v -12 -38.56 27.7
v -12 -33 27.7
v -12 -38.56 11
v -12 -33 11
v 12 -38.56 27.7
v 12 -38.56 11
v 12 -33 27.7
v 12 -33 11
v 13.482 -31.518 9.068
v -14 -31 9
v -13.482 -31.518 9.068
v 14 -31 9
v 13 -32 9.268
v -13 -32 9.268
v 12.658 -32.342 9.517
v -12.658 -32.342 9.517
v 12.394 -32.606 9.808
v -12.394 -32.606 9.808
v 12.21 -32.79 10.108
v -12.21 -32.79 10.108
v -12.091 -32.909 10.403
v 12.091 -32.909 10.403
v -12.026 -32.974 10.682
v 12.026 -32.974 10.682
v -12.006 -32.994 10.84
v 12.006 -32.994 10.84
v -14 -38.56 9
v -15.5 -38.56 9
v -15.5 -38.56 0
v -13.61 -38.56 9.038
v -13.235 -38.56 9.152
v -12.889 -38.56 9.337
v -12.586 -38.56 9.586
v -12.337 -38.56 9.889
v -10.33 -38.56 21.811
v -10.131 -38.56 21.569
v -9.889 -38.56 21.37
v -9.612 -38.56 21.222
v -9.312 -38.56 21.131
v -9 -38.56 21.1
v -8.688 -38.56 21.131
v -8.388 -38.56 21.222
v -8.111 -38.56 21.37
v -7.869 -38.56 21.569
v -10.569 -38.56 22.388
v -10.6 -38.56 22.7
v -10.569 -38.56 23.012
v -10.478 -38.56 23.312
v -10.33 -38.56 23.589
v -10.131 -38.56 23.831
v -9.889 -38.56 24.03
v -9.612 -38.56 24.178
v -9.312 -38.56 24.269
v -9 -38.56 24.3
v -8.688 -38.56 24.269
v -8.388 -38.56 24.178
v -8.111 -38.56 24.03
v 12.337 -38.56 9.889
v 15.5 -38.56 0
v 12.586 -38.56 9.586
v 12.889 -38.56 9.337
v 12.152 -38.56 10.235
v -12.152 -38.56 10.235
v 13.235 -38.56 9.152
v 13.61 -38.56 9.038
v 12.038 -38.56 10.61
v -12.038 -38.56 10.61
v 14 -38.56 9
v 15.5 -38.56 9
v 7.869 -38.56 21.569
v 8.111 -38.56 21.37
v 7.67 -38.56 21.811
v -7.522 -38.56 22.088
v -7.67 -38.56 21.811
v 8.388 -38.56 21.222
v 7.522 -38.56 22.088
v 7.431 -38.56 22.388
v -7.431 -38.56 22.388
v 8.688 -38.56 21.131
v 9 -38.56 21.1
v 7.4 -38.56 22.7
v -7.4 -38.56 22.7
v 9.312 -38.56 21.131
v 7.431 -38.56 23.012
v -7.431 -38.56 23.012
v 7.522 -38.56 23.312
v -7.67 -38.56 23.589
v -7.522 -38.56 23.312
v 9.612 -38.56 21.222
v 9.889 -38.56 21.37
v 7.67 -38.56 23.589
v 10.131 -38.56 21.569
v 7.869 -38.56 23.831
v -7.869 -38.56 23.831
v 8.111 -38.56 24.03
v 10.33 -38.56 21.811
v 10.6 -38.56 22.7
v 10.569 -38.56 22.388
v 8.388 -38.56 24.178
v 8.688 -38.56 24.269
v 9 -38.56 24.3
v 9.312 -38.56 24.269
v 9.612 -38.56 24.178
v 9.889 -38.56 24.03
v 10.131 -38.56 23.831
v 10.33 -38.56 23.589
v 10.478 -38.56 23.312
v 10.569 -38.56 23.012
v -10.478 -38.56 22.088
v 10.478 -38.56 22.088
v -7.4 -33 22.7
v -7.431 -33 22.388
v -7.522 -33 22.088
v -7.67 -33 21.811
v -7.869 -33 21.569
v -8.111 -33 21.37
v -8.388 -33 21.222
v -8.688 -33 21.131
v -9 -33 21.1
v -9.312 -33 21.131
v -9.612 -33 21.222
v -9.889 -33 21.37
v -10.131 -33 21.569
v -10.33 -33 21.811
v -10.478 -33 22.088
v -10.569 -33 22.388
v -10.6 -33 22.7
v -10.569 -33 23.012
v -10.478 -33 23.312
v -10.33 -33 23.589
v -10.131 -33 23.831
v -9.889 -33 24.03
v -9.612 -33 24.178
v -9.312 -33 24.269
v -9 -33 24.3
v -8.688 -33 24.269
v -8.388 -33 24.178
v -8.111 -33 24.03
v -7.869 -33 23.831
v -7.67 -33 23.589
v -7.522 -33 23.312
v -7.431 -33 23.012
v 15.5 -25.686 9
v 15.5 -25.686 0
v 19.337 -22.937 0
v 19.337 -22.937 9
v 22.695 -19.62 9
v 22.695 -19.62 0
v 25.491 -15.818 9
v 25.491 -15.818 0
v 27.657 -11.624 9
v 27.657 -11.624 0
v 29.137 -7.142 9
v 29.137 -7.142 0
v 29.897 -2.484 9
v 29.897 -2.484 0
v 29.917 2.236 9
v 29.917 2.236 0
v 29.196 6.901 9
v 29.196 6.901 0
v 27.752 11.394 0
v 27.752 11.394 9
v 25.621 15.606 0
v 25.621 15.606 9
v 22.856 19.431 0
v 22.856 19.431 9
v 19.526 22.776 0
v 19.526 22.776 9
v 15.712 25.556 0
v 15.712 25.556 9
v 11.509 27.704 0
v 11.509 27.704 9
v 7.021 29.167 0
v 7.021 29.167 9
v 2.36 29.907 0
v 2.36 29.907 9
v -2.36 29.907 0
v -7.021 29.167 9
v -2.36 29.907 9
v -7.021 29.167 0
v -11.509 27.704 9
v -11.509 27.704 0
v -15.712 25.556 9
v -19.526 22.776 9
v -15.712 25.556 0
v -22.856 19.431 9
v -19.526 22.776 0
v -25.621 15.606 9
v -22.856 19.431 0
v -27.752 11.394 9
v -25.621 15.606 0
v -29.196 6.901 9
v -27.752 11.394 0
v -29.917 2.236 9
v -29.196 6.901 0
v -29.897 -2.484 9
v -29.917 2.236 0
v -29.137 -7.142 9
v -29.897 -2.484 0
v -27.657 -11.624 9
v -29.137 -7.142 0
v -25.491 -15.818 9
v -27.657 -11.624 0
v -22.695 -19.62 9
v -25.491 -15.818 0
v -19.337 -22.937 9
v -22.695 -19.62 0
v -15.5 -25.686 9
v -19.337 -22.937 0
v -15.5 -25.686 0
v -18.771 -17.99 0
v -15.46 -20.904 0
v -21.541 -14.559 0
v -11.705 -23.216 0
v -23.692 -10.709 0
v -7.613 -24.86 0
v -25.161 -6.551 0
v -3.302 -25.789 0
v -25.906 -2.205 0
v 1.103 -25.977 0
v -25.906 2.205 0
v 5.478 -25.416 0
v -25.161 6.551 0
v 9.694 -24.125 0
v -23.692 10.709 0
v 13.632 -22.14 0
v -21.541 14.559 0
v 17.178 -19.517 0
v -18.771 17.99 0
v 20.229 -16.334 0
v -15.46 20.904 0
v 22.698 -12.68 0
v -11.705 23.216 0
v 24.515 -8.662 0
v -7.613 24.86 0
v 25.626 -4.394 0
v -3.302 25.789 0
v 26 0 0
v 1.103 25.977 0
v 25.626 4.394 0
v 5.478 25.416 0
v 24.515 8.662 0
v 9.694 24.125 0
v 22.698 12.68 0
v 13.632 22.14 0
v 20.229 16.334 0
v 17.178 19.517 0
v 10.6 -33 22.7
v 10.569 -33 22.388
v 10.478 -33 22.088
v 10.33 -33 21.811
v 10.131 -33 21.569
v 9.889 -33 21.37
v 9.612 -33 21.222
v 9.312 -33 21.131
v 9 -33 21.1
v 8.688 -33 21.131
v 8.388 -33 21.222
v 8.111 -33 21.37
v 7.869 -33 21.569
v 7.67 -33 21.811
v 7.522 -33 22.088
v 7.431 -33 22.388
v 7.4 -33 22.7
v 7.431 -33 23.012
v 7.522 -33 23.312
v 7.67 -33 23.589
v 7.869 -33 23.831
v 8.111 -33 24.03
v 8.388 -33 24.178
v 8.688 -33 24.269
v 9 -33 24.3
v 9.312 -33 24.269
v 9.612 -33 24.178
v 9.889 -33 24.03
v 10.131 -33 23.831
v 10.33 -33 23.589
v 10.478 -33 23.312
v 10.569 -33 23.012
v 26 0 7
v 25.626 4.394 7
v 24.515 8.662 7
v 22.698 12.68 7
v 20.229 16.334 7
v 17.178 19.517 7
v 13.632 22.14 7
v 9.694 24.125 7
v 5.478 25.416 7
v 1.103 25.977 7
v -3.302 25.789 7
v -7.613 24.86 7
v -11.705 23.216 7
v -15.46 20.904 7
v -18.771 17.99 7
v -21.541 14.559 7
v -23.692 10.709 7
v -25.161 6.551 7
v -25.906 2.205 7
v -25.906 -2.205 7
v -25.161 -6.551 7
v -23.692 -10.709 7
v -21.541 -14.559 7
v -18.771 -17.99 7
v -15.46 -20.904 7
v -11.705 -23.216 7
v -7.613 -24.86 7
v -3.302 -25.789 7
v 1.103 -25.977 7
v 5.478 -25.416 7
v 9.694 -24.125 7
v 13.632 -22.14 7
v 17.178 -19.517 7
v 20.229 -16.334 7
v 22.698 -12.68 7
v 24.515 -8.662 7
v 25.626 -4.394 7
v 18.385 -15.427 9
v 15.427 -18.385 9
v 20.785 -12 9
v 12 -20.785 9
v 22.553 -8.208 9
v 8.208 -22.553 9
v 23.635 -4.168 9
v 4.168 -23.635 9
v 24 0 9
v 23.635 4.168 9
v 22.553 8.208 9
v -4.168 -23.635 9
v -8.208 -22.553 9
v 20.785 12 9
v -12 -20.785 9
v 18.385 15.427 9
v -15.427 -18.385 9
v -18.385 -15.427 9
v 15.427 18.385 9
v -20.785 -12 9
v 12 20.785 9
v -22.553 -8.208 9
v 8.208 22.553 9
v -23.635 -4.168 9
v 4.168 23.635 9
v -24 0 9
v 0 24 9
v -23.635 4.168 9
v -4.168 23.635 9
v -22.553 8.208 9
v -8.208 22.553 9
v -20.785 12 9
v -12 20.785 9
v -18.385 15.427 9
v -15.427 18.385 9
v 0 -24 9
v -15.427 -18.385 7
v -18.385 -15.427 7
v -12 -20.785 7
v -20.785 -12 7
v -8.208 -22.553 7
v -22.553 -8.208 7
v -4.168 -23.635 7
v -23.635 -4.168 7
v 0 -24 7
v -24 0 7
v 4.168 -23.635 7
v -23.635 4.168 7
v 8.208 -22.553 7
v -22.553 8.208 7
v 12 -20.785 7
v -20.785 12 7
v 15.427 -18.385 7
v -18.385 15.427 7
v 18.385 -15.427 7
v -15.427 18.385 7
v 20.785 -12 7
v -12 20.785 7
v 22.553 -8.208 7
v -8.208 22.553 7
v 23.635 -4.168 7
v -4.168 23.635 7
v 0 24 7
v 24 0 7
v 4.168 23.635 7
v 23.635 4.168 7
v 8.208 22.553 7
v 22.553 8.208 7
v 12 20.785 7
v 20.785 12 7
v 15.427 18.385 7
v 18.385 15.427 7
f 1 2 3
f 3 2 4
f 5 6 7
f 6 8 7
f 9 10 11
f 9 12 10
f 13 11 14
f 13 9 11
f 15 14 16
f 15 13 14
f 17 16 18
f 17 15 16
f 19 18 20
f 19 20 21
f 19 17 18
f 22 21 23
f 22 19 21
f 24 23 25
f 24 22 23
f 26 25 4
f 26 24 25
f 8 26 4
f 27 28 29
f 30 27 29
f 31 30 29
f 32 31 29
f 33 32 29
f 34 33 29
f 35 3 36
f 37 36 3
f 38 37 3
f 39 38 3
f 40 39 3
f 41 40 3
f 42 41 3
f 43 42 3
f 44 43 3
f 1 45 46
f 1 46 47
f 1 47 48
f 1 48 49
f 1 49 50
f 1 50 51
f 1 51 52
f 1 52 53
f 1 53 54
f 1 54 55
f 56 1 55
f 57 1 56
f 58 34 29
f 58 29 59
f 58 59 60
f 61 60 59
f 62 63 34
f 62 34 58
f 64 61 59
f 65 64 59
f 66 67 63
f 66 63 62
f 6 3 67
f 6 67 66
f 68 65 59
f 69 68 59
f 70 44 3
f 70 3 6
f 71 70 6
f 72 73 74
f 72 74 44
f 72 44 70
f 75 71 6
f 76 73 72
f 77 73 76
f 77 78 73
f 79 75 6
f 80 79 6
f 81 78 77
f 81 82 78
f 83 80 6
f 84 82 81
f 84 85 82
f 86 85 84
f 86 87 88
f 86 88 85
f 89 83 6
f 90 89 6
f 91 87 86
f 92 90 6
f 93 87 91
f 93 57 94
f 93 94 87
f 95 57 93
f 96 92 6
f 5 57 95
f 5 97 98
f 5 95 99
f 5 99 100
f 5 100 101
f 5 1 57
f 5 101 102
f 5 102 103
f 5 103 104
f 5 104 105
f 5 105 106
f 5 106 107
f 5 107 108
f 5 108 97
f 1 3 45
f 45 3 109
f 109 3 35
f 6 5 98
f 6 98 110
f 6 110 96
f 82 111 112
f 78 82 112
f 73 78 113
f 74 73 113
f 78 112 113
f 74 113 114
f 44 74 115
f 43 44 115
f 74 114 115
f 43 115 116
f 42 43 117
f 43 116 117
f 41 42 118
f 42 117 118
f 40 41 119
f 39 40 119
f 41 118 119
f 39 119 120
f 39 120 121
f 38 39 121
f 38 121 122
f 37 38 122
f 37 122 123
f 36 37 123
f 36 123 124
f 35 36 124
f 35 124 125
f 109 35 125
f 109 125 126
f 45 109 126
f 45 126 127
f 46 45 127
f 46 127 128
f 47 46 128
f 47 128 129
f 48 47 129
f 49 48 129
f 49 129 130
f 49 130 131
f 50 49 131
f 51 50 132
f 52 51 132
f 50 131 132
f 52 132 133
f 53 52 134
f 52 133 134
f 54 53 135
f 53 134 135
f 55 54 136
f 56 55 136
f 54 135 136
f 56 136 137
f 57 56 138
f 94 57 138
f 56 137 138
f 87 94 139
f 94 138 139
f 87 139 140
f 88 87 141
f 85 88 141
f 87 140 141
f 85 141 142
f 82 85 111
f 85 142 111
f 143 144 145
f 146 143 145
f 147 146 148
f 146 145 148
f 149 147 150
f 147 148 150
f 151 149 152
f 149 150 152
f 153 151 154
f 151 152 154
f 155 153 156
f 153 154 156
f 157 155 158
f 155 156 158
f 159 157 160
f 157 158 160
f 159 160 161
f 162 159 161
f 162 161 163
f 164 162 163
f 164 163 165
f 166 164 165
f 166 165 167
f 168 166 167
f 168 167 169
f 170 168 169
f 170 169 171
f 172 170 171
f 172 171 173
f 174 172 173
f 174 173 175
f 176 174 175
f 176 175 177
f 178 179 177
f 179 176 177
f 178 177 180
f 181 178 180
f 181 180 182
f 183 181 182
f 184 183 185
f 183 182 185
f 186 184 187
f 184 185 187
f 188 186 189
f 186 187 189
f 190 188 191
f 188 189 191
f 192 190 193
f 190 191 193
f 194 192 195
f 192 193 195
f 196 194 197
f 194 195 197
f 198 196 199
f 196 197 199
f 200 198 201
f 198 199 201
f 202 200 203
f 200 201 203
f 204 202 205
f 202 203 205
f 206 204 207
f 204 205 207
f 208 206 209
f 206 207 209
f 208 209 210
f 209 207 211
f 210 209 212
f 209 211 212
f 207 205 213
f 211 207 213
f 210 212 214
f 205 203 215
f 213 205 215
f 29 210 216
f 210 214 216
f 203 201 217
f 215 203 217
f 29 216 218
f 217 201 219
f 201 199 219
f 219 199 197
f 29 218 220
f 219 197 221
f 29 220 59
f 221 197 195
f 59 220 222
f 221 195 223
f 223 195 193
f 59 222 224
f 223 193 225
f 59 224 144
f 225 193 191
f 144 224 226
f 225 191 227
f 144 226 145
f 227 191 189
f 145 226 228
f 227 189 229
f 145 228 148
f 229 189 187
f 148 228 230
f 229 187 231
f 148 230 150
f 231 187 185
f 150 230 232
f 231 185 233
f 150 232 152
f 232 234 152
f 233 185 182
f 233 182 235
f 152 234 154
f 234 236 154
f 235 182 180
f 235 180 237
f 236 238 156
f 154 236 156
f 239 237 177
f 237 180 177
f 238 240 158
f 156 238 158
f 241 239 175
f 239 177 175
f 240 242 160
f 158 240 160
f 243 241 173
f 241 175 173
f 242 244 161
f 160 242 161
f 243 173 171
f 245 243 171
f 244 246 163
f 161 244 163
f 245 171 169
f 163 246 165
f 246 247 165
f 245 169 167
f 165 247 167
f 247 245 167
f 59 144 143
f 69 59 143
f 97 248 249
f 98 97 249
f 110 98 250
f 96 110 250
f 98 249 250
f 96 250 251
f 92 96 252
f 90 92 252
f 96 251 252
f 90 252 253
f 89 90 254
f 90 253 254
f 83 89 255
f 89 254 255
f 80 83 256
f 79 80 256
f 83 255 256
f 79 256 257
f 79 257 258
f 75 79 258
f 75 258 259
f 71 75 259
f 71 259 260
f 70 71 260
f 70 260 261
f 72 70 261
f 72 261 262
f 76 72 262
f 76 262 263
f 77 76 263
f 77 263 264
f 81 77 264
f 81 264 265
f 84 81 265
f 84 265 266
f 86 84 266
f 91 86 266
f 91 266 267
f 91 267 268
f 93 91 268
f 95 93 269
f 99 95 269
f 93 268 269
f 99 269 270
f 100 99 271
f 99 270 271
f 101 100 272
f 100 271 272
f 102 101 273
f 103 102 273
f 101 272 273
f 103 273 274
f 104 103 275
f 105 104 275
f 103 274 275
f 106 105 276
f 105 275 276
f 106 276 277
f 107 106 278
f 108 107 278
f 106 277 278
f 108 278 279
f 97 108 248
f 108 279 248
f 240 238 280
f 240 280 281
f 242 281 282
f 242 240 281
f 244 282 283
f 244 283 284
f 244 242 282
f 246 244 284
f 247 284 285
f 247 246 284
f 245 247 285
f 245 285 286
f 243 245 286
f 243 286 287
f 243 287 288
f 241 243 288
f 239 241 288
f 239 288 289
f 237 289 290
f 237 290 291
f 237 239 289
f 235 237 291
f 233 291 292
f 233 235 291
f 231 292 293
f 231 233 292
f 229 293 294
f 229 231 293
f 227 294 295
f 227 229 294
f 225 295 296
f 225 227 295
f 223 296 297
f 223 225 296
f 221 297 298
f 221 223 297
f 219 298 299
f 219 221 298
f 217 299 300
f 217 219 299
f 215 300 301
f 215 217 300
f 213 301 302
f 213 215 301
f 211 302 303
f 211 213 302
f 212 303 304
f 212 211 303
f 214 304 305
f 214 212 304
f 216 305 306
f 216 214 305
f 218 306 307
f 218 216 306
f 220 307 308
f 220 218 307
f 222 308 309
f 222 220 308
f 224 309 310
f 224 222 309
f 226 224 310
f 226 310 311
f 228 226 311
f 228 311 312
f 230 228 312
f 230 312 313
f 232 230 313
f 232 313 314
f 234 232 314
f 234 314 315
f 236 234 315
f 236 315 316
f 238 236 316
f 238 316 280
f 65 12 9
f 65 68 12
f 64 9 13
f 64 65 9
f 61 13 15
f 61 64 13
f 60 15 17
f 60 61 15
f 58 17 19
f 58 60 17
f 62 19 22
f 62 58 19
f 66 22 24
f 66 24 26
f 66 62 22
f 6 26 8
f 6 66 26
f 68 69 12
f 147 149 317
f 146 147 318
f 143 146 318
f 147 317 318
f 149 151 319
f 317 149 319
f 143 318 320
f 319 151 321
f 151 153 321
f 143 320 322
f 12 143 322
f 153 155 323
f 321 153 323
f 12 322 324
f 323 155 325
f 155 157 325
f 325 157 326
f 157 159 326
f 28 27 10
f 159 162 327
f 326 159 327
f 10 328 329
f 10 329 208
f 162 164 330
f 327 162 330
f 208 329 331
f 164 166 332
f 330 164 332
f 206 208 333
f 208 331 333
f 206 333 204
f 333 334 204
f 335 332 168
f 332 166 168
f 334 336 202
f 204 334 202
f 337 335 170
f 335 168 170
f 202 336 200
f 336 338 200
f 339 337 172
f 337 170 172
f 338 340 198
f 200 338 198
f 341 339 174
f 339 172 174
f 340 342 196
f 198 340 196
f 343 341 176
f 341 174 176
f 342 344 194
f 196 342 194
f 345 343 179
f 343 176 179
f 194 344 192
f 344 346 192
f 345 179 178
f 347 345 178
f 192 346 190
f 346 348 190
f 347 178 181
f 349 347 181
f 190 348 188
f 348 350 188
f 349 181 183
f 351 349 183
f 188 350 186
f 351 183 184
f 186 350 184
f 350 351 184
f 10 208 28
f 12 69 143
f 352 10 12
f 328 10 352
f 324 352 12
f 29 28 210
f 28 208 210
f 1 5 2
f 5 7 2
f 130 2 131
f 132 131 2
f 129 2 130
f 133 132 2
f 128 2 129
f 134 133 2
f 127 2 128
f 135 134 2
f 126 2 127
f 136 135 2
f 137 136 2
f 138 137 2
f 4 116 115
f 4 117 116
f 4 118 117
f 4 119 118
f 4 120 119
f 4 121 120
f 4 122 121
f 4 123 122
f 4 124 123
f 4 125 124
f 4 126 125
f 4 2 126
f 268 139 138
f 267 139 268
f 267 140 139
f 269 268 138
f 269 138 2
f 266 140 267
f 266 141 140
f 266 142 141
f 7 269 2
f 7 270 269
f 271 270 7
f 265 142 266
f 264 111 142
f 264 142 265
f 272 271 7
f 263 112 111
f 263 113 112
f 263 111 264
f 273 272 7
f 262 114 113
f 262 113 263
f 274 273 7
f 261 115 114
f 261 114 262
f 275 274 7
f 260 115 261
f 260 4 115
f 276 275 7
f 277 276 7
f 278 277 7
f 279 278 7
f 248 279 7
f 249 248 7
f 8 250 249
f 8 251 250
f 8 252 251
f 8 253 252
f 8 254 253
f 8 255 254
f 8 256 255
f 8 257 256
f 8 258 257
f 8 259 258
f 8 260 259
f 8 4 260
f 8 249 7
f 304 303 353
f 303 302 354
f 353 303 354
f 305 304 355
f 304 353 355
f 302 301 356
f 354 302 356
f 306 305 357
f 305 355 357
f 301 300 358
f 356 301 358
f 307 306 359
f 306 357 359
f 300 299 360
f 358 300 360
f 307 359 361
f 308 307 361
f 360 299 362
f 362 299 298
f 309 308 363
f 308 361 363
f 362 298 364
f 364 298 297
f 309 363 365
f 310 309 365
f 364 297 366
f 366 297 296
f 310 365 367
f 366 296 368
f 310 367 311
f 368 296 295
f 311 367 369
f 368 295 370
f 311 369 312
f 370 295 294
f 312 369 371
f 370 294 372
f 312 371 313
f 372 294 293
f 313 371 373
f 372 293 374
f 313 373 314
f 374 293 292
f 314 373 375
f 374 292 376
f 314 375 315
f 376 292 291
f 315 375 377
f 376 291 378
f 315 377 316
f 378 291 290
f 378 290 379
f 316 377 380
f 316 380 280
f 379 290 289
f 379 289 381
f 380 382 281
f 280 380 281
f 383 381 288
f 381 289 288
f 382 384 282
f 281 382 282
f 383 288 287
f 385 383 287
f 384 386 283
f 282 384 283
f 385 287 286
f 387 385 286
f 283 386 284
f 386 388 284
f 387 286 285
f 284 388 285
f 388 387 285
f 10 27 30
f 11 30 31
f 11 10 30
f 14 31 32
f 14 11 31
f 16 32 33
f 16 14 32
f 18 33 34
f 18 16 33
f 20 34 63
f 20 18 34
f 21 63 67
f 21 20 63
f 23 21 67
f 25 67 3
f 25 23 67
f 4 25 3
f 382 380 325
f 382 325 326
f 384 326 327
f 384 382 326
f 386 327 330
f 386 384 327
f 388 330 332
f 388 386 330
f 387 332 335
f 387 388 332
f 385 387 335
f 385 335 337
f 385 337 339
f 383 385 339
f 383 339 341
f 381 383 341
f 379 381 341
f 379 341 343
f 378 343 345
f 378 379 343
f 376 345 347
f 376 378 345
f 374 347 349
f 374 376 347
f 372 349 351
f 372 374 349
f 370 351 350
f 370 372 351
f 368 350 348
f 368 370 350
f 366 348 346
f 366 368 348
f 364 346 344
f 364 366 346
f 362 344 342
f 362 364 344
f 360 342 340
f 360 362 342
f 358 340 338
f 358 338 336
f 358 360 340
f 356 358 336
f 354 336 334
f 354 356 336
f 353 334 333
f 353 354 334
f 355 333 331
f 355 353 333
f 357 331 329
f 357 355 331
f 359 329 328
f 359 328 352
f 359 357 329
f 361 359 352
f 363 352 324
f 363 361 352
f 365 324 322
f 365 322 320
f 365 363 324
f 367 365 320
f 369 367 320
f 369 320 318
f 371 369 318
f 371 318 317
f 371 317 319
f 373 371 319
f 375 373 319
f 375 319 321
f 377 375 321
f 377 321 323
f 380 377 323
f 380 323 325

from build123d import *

# Parameters (mm, degrees)
SKETCH_1_R          = 26
EXTRUDE_1_DEPTH     = 7
SKETCH_4_R          = 30
SKETCH_4_R_2        = 24
EXTRUDE_4_DEPTH     = 2
SKETCH_5_W          = 24
SKETCH_5_H          = 5
EXTRUDE_5_DEPTH     = 20.7
EXTRUDE_6_DEPTH     = 2
EXTRUDE_7_DEPTH     = 0.56
SKETCH_7_R          = 1.6
CUT_EXTRUDE_1_DEPTH = 16
FILLET_1_R          = 2
FILLET_2_R          = 2
FILLET_3_R          = 2


with BuildPart() as part:
    # 草图1 → 凸台-拉伸1 (new body)
    with BuildSketch(Plane.XY):
        with BuildLine():
            Line((-15.5, -38), (15.5, -38))
            Line((15.5, -38), (15.5, -25.685599078))
            ThreePointArc((15.5, -25.685599078), (0, 30), (-15.5, -25.685599078))
            Line((-15.5, -25.685599078), (-15.5, -38))
        make_face()
        Circle(SKETCH_1_R, mode=Mode.SUBTRACT)
    extrude(amount=EXTRUDE_1_DEPTH)

    # 草图4 → 凸台-拉伸4 (add)
    with BuildSketch(Plane.XY.offset(7)):
        Circle(SKETCH_4_R)
        Circle(SKETCH_4_R_2, mode=Mode.SUBTRACT)
    extrude(amount=EXTRUDE_4_DEPTH)

    # 草图5 → 凸台-拉伸5 (add)
    with BuildSketch(Plane.XY.offset(7)):
        with Locations((0, -35.5)):
            Rectangle(SKETCH_5_W, SKETCH_5_H)
    extrude(amount=EXTRUDE_5_DEPTH)

    # 草图6 → 凸台-拉伸6 (add)
    with BuildSketch(Plane.XY.offset(7)):
        with BuildLine():
            Line((-15.5, -25.685599078), (-15.5, -38))
            Line((-15.5, -38), (-12, -38))
            Line((-12, -38), (-12, -33))
            Line((-12, -33), (12, -33))
            Line((12, -33), (12, -38))
            Line((12, -38), (15.5, -38))
            Line((15.5, -38), (15.5, -25.685599078))
            ThreePointArc((15.5, -25.685599078), (0, -30), (-15.5, -25.685599078))
        make_face()
    extrude(amount=EXTRUDE_6_DEPTH)

    # 草图9 → 凸台-拉伸7 (add)
    with BuildSketch(Plane.XZ.offset(38)):
        Polygon((15.5, 0), (15.5, 9), (12, 9), (12, 27.7), (-12, 27.7), (-12, 9), (-15.5, 9), (-15.5, 0), align=None)
    extrude(amount=EXTRUDE_7_DEPTH)

    # 草图7 → 切除-拉伸1 (cut)
    with BuildSketch(Plane(origin=(0, -33, 0), x_dir=(1, 0, 0), z_dir=(0, 1, 0))):
        with Locations((9, -22.7)):
            Circle(SKETCH_7_R)
        with Locations((-9, -22.7)):
            Circle(SKETCH_7_R)
    extrude(amount=-CUT_EXTRUDE_1_DEPTH, mode=Mode.SUBTRACT)

    # 圆角1
    fillet_1_edges = [part.edges().sort_by_distance(p)[0] for p in [
        (0, -33, 9),
    ]]
    fillet(fillet_1_edges, radius=FILLET_1_R)

    # 圆角2
    fillet_2_edges = [part.edges().sort_by_distance(p)[0] for p in [
        (12, -35.78, 9),
    ]]
    fillet(fillet_2_edges, radius=FILLET_2_R)

    # 圆角3
    fillet_3_edges = [part.edges().sort_by_distance(p)[0] for p in [
        (-12, -35.78, 9),
    ]]
    fillet(fillet_3_edges, radius=FILLET_3_R)


solid = part.part
